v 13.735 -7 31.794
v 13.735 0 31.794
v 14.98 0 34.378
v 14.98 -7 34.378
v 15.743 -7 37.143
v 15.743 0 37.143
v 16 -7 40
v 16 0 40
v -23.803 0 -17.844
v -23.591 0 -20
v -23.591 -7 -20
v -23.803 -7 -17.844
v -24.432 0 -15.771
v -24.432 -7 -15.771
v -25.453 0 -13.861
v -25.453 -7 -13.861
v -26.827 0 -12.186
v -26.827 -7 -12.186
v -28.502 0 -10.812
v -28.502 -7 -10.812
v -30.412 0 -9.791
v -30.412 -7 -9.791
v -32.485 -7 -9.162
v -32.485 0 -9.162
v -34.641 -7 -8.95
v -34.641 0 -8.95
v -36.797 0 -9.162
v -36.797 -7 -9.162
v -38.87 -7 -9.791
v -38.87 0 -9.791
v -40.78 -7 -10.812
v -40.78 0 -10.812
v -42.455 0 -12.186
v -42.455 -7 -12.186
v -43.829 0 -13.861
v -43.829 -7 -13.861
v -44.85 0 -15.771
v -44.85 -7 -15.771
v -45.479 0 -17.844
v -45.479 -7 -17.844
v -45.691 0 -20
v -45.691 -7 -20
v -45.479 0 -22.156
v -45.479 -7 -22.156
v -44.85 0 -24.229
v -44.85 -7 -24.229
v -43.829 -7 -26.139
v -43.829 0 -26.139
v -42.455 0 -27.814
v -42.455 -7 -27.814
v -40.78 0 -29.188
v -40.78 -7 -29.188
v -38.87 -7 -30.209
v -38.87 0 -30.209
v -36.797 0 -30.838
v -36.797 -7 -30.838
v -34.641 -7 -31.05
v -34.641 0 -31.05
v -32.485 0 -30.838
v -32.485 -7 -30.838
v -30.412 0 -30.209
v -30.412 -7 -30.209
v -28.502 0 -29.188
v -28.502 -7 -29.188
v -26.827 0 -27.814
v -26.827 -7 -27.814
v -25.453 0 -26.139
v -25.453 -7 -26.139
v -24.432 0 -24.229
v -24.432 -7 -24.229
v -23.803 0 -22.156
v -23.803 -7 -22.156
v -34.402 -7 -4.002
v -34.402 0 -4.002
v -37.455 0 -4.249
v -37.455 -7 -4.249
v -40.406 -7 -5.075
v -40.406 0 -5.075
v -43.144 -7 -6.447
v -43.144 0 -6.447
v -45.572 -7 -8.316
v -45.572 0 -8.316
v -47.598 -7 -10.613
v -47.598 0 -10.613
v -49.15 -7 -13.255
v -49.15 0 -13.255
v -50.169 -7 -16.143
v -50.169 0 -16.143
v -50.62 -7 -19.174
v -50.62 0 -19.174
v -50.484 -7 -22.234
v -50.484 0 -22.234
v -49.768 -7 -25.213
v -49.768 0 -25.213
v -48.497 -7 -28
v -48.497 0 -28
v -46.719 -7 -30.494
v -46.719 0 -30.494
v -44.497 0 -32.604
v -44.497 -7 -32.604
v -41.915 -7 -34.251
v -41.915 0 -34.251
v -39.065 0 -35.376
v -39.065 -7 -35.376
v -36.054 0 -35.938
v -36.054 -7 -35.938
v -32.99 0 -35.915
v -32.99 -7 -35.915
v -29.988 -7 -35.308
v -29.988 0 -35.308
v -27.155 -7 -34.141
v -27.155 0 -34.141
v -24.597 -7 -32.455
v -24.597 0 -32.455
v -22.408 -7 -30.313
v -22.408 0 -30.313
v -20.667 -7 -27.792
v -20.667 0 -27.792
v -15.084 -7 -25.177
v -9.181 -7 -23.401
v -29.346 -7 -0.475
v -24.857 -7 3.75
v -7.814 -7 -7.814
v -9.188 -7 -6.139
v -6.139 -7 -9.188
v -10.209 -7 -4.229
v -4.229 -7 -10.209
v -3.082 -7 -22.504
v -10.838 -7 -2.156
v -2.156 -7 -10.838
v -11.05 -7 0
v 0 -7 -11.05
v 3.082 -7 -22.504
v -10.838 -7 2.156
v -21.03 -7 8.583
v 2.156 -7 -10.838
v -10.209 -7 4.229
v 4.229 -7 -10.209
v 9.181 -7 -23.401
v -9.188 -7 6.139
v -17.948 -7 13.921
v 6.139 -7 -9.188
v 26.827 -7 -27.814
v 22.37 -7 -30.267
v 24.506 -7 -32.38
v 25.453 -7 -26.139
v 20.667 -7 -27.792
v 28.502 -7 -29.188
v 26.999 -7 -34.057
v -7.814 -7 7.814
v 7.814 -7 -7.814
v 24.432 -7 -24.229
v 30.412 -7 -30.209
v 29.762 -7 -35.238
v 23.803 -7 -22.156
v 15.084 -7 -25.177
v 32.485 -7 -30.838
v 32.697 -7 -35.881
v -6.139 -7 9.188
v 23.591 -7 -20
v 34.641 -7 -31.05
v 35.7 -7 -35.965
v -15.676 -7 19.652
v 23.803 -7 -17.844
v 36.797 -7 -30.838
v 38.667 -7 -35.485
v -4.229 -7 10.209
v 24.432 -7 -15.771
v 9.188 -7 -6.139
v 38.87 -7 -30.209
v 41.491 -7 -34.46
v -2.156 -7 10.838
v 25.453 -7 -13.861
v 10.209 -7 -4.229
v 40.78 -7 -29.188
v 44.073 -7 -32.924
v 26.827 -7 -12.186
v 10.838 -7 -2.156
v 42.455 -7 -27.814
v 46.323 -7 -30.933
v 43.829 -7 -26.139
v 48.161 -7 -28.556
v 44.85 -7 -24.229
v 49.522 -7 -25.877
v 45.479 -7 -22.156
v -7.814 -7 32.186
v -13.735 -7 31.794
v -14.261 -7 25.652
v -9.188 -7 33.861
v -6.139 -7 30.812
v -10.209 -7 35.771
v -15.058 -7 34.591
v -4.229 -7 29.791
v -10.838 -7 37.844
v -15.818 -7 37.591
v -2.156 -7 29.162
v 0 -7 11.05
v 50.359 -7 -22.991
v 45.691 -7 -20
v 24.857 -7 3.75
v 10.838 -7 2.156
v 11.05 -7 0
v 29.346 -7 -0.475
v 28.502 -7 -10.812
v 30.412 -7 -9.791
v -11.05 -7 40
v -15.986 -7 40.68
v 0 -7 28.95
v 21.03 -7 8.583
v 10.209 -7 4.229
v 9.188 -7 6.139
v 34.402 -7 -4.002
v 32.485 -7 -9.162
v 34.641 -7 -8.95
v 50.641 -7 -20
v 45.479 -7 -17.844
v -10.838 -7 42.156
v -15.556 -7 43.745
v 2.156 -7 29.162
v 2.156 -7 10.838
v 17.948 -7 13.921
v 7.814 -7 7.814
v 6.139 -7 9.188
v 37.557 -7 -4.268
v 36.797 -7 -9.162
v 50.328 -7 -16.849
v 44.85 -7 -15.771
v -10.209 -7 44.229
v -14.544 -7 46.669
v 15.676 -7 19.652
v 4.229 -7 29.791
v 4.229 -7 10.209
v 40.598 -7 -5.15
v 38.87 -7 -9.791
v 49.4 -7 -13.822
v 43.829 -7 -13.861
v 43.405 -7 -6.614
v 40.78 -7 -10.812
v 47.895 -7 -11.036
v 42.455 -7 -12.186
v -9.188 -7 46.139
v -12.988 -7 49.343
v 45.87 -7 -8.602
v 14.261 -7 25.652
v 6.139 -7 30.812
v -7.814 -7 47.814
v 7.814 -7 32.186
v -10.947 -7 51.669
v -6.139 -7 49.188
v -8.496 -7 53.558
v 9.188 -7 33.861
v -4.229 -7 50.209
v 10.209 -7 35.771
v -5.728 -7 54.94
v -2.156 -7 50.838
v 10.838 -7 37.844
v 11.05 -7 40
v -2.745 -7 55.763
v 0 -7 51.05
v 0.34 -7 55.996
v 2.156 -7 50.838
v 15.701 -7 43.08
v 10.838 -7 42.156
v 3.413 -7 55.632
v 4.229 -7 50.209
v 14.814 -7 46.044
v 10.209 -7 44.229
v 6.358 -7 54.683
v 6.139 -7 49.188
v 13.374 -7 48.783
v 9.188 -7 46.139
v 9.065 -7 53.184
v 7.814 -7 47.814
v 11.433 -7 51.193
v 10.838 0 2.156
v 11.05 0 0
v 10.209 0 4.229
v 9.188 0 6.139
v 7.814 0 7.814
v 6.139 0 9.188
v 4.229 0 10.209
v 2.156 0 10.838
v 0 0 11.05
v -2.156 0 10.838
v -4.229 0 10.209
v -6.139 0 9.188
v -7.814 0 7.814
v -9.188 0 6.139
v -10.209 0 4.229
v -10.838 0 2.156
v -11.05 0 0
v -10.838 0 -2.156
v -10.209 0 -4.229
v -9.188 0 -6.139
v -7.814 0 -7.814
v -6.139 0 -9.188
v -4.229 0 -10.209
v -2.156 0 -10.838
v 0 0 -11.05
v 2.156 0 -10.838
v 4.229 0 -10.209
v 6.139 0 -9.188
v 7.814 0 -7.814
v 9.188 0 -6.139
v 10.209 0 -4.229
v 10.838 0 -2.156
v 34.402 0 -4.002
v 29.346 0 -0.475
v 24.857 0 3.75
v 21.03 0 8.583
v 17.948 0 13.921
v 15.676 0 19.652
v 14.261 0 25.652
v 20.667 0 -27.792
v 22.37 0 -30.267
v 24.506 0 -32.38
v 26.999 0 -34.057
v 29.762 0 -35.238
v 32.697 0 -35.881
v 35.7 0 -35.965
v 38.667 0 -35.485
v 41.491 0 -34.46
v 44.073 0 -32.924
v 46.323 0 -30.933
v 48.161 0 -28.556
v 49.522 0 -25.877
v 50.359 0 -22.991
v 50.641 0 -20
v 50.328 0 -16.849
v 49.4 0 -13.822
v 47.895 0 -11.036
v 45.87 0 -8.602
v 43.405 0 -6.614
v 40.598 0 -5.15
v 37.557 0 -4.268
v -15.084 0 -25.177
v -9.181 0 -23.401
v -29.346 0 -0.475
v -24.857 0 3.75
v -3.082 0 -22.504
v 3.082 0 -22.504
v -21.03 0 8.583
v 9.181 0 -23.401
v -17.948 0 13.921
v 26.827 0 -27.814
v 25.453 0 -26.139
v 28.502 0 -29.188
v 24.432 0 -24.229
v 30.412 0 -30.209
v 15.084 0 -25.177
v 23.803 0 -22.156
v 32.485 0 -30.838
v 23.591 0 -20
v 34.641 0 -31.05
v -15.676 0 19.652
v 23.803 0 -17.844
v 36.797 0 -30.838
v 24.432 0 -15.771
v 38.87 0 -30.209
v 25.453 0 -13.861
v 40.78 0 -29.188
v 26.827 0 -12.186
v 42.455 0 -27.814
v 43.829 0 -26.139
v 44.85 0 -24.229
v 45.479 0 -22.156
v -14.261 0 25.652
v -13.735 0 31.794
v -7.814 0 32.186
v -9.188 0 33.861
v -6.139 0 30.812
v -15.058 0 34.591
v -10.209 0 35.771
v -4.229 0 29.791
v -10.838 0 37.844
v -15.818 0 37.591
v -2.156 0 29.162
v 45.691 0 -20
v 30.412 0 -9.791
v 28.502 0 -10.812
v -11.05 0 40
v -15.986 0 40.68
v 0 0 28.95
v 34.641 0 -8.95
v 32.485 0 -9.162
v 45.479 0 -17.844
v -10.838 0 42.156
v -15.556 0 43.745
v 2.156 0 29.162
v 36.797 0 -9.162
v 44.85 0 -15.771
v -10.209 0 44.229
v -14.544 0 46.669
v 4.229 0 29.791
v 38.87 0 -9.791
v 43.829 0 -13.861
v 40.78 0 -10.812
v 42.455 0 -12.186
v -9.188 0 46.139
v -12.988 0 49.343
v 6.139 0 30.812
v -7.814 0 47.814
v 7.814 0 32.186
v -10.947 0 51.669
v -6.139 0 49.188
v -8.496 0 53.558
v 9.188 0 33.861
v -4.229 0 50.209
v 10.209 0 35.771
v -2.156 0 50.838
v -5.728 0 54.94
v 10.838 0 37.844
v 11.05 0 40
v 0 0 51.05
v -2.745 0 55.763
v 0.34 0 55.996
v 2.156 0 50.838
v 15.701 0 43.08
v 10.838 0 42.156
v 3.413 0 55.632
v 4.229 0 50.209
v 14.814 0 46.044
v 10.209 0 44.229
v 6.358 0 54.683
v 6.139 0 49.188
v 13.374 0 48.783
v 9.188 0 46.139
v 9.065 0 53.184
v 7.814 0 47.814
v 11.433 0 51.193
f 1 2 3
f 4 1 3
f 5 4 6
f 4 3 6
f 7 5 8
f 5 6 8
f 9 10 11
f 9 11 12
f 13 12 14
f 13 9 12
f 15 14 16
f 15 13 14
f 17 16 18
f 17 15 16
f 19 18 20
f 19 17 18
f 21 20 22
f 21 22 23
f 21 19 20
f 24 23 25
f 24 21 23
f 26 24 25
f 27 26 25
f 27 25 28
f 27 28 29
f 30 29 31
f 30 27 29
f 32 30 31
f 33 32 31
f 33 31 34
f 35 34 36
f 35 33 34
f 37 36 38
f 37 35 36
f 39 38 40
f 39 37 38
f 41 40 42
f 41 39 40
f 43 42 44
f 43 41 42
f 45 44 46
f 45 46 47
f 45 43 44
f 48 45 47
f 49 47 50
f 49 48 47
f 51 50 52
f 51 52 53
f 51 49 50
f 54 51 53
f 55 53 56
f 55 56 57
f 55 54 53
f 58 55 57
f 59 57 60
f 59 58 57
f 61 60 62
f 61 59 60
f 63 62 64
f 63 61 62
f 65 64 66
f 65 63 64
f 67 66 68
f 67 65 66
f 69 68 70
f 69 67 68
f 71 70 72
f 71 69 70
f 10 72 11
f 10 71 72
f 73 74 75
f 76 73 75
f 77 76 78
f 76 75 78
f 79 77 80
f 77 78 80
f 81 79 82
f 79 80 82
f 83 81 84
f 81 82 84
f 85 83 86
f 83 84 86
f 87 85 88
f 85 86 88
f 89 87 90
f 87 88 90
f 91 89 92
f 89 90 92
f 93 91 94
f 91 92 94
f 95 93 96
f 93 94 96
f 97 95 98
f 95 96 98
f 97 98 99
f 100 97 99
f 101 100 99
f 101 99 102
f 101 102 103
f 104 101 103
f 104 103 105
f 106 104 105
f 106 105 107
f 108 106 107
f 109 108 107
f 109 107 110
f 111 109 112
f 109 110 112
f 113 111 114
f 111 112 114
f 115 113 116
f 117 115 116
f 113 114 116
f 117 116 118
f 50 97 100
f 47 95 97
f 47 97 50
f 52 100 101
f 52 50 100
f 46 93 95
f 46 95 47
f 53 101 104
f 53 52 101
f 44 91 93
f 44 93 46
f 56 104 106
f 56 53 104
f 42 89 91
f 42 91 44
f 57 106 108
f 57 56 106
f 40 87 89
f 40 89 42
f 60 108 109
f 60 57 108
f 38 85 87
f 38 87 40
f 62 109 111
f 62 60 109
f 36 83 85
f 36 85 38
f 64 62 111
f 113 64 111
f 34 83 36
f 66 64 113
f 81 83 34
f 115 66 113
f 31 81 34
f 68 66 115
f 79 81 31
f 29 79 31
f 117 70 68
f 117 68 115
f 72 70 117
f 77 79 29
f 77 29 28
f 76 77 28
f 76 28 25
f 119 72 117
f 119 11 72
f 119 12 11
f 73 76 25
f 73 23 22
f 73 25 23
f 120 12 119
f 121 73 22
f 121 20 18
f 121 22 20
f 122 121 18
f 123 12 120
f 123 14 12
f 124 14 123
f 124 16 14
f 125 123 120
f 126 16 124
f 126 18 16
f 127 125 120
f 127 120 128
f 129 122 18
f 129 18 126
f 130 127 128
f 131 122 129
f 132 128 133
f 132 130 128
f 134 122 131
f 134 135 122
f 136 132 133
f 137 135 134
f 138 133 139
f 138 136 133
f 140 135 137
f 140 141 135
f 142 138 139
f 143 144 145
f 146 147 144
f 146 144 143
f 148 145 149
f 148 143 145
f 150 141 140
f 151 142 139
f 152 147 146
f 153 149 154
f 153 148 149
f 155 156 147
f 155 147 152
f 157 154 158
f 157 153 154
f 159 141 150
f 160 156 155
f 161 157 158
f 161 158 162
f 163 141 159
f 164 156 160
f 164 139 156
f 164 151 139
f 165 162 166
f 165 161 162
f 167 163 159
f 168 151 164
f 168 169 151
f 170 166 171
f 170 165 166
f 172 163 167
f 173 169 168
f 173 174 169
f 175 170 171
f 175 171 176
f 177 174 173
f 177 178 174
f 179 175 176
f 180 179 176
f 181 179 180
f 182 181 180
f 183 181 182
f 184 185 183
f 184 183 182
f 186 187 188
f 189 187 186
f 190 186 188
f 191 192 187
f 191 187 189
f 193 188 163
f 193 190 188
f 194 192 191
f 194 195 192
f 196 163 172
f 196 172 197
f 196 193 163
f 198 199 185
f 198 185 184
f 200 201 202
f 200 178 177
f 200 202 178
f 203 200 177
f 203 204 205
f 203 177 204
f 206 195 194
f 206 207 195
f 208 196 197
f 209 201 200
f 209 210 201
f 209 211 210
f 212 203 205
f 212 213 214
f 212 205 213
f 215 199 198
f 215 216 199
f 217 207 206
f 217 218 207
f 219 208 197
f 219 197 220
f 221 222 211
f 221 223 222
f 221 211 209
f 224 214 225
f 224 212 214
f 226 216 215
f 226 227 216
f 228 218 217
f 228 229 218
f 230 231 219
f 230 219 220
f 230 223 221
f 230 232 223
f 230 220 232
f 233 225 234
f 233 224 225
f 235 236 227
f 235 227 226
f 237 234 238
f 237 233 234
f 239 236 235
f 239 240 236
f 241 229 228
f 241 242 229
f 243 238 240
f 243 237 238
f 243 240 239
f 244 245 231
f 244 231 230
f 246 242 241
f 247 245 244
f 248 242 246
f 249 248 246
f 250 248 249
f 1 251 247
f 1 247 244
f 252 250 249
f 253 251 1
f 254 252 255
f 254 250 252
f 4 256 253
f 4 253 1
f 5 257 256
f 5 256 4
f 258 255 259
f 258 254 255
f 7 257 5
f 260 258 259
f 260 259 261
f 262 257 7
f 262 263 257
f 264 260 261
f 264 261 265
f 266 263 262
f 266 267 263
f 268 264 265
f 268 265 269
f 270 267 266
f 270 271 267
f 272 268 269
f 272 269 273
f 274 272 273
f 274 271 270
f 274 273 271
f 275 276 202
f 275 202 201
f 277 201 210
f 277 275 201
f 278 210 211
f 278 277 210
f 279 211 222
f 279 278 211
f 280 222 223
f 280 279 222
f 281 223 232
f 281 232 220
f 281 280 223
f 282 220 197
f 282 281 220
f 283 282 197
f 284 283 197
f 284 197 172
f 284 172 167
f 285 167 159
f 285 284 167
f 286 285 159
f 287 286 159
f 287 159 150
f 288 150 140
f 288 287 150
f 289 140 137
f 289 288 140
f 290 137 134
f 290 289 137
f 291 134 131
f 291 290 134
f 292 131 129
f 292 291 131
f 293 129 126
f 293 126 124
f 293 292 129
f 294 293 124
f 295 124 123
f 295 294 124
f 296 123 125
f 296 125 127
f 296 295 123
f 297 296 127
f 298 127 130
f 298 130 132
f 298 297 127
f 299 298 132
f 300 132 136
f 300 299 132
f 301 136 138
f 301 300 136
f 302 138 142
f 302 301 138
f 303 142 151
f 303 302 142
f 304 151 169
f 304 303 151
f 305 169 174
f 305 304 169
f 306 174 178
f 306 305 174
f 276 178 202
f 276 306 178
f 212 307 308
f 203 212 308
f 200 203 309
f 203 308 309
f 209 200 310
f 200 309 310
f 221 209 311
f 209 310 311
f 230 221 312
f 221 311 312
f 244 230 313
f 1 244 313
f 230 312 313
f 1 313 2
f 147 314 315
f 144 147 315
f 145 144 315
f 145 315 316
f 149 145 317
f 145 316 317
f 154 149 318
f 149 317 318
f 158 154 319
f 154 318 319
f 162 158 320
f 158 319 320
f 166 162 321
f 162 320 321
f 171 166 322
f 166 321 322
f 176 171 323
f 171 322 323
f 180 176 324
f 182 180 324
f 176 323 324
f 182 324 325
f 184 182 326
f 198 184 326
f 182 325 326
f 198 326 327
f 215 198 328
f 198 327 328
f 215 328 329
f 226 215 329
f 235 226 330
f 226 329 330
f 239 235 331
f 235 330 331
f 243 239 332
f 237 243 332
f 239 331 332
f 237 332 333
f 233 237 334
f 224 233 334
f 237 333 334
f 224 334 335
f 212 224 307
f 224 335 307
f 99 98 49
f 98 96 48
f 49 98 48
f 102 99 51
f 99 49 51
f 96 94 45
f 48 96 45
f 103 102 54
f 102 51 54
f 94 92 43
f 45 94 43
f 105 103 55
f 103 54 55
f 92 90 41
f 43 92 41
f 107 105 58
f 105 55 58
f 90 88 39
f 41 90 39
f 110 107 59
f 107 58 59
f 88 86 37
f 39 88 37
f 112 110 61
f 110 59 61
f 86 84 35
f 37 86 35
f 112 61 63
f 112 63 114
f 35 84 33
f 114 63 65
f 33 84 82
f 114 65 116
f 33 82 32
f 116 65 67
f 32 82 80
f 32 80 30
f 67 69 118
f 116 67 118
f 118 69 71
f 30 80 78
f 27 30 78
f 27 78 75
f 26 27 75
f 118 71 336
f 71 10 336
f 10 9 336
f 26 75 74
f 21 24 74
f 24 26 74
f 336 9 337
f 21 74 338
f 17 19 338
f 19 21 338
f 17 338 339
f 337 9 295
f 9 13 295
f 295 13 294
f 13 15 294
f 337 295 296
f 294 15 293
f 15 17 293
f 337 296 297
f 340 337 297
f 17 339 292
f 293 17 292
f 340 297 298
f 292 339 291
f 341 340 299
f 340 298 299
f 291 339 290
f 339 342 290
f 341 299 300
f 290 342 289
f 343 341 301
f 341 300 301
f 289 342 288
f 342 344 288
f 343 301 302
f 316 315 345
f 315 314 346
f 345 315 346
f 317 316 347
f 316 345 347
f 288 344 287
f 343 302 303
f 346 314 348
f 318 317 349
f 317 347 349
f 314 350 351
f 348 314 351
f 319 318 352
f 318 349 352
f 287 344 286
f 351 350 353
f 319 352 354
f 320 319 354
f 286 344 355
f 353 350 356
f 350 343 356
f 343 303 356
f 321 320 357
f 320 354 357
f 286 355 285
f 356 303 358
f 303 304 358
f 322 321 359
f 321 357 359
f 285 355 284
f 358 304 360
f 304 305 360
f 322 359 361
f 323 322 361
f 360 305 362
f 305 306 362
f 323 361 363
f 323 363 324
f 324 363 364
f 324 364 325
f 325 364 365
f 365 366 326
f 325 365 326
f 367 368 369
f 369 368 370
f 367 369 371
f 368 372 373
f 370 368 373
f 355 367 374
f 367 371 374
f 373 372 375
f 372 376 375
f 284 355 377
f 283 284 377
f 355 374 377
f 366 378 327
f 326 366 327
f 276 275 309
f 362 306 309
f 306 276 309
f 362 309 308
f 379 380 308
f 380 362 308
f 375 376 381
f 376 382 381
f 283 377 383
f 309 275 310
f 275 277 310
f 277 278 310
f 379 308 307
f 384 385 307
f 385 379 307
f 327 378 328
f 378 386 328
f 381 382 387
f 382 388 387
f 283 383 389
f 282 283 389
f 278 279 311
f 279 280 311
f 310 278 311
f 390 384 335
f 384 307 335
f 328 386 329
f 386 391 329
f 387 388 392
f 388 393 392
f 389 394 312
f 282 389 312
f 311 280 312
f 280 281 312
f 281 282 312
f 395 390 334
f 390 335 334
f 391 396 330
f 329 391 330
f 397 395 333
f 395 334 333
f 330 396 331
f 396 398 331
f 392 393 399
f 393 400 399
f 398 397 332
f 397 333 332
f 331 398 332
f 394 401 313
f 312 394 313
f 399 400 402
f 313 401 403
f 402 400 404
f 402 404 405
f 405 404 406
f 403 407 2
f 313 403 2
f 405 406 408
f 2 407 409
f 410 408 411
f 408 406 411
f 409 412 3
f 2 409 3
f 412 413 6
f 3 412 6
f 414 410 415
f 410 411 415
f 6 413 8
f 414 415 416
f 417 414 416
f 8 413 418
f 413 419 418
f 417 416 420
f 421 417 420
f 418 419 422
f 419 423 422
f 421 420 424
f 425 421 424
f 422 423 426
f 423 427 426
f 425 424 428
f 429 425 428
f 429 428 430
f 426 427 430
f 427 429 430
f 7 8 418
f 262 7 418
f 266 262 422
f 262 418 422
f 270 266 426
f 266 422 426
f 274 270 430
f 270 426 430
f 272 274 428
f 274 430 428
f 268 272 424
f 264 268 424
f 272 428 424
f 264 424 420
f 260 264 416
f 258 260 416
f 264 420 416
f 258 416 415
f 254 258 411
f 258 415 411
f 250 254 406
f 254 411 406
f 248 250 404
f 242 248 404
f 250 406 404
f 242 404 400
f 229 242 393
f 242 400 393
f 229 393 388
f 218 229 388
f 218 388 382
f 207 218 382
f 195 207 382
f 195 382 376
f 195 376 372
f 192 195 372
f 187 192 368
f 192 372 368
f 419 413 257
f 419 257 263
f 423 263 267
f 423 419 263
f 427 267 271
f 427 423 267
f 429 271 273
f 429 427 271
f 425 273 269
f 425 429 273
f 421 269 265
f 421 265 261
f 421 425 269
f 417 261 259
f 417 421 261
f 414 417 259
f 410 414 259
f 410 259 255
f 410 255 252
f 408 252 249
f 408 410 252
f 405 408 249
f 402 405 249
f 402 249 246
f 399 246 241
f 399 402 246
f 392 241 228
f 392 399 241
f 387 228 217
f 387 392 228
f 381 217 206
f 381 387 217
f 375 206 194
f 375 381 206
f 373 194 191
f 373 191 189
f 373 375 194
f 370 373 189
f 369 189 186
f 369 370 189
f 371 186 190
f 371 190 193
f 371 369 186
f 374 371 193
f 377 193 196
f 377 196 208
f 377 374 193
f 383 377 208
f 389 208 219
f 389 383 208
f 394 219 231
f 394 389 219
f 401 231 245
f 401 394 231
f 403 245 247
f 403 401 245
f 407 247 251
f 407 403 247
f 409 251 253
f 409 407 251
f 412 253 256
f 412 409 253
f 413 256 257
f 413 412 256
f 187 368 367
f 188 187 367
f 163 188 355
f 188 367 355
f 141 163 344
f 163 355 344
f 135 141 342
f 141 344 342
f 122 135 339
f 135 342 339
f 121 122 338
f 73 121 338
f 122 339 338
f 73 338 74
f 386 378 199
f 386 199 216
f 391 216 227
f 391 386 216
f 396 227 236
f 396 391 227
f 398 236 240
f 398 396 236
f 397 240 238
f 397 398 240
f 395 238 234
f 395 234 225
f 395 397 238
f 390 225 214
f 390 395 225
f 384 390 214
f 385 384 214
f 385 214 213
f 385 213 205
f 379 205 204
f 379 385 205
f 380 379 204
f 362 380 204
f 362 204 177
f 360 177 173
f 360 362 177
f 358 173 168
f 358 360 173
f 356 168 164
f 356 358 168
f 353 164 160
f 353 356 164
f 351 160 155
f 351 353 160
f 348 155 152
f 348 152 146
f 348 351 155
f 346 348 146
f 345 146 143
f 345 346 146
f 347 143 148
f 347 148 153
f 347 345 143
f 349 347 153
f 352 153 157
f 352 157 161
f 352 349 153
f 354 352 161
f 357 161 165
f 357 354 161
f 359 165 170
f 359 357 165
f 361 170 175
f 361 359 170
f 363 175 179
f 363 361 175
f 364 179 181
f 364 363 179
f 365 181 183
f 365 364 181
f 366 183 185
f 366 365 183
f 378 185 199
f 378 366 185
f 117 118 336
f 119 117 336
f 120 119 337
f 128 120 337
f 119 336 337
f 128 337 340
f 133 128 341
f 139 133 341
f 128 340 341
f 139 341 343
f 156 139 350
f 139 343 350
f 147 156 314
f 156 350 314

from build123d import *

# Parameters (mm, degrees)
F0_R     = 11.05
F1_DEPTH = 7


with BuildPart() as f1:
    # F0 (on Front) → F1 (new body)
    with BuildSketch(Plane.XZ):
        with BuildLine():
            ThreePointArc((-18.641016, -20), (-23.243086, -8.771145), (-34.401914, -4.001787))
            ThreePointArc((-34.401914, -4.001787), (-48.497423, -28), (-20.666606, -27.792039))
            ThreePointArc((-20.666606, -27.792039), (-19.155691, -24.025509), (-18.641016, -20))
        make_face()
        with Locations((-34.641016, -20)):
            Circle(F0_R, mode=Mode.SUBTRACT)
        with BuildLine():
            ThreePointArc((13.735308, 31.793825), (0, 24), (-13.735308, 31.793825))
            ThreePointArc((-13.735308, 31.793825), (-19.391728, 11.195819), (-34.401914, -4.001787))
            ThreePointArc((-34.401914, -4.001787), (-23.243086, -8.771145), (-18.641016, -20))
            ThreePointArc((-18.641016, -20), (-19.155691, -24.025509), (-20.666606, -27.792039))
            ThreePointArc((-20.666606, -27.792039), (0, -22.391639), (20.666606, -27.792039))
            ThreePointArc((20.666606, -27.792039), (20.78461, -12), (34.401914, -4.001787))
            ThreePointArc((34.401914, -4.001787), (19.391728, 11.195819), (13.735308, 31.793825))
        make_face()
        Circle(F0_R, mode=Mode.SUBTRACT)
        with BuildLine():
            ThreePointArc((13.735308, 31.793825), (15.423439, 35.74353), (16, 40))
            ThreePointArc((16, 40), (-4.25647, 55.423439), (-13.735308, 31.793825))
            ThreePointArc((-13.735308, 31.793825), (0, 24), (13.735308, 31.793825))
        make_face()
        with Locations((0, 40)):
            Circle(F0_R, mode=Mode.SUBTRACT)
        with BuildLine():
            ThreePointArc((50.641016, -20), (45.869871, -8.60207), (34.401914, -4.001787))
            ThreePointArc((34.401914, -4.001787), (20.78461, -12), (20.666606, -27.792039))
            ThreePointArc((20.666606, -27.792039), (38.666525, -35.485325), (50.641016, -20))
        make_face()
        with Locations((34.641016, -20)):
            Circle(F0_R, mode=Mode.SUBTRACT)
    extrude(amount=F1_DEPTH)


solid = f1.part
